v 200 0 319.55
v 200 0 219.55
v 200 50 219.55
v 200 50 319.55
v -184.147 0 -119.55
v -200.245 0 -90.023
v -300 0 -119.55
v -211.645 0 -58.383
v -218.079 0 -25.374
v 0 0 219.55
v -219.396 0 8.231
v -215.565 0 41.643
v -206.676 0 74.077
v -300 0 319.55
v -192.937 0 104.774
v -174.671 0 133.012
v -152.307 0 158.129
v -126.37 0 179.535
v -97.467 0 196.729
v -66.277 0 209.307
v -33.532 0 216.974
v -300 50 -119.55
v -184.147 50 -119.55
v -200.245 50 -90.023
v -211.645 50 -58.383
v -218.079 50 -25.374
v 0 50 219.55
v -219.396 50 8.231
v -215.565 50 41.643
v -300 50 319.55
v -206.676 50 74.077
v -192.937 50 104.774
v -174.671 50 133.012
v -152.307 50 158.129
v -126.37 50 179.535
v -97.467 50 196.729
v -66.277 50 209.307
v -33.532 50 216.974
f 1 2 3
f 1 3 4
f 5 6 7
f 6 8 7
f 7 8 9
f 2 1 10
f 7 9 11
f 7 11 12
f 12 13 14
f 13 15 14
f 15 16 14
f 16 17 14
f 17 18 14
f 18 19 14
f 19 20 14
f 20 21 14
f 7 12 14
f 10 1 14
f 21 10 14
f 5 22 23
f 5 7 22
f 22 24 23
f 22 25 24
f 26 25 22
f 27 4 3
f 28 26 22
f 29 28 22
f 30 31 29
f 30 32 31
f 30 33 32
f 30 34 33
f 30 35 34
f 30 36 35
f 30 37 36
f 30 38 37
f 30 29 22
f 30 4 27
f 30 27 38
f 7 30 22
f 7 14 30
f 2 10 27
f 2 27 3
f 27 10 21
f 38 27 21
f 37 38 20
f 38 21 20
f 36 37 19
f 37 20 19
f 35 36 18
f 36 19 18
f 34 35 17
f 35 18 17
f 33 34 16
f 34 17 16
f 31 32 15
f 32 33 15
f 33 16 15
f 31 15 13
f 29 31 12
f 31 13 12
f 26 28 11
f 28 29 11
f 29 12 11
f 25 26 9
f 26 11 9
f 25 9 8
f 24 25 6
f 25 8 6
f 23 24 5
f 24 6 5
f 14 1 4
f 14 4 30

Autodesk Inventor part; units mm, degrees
ref_plane "YZ Plane" through (0, 0, 0) normal (1, 0, 0) x (0, 1, 0)
ref_plane "XZ Plane" through (0, 0, 0) normal (0, 1, 0) x (-1, 0, 0)
ref_plane "XY Plane" through (0, 0, 0) normal (0, 0, 1) x (1, 0, 0)
sketch "Sketch1" plane through (0, 0, 0) normal (0, 1, 0) x (-1, 0, 0)
  line L0 (0, -151.455) -> (0, 151.455) construction
  line L1 (30.6851, 0) -> (-30.6851, 0) construction
  arc A0 (184.1467, -119.55) -> (0, 219.55) centre (0, 0) ccw
  line L2 (0, 219.55) -> (-200, 219.55)
  line L3 (-200, 219.55) -> (-200, 319.55)
  line L4 (-200, 319.55) -> (300, 319.55)
  line L5 (300, 319.55) -> (300, -119.55)
  line L6 (300, -119.55) -> (184.1467, -119.55)
  dimension "d0" = 439.1
  dimension "d1" = 200
  dimension "d3" = 100
  dimension "d4" = 119.55
  dimension "d5" = 300
extrude "Extrusion1" add sketch "Sketch1" along normal blind 50
properties part number "WoodBoundaryV1"
